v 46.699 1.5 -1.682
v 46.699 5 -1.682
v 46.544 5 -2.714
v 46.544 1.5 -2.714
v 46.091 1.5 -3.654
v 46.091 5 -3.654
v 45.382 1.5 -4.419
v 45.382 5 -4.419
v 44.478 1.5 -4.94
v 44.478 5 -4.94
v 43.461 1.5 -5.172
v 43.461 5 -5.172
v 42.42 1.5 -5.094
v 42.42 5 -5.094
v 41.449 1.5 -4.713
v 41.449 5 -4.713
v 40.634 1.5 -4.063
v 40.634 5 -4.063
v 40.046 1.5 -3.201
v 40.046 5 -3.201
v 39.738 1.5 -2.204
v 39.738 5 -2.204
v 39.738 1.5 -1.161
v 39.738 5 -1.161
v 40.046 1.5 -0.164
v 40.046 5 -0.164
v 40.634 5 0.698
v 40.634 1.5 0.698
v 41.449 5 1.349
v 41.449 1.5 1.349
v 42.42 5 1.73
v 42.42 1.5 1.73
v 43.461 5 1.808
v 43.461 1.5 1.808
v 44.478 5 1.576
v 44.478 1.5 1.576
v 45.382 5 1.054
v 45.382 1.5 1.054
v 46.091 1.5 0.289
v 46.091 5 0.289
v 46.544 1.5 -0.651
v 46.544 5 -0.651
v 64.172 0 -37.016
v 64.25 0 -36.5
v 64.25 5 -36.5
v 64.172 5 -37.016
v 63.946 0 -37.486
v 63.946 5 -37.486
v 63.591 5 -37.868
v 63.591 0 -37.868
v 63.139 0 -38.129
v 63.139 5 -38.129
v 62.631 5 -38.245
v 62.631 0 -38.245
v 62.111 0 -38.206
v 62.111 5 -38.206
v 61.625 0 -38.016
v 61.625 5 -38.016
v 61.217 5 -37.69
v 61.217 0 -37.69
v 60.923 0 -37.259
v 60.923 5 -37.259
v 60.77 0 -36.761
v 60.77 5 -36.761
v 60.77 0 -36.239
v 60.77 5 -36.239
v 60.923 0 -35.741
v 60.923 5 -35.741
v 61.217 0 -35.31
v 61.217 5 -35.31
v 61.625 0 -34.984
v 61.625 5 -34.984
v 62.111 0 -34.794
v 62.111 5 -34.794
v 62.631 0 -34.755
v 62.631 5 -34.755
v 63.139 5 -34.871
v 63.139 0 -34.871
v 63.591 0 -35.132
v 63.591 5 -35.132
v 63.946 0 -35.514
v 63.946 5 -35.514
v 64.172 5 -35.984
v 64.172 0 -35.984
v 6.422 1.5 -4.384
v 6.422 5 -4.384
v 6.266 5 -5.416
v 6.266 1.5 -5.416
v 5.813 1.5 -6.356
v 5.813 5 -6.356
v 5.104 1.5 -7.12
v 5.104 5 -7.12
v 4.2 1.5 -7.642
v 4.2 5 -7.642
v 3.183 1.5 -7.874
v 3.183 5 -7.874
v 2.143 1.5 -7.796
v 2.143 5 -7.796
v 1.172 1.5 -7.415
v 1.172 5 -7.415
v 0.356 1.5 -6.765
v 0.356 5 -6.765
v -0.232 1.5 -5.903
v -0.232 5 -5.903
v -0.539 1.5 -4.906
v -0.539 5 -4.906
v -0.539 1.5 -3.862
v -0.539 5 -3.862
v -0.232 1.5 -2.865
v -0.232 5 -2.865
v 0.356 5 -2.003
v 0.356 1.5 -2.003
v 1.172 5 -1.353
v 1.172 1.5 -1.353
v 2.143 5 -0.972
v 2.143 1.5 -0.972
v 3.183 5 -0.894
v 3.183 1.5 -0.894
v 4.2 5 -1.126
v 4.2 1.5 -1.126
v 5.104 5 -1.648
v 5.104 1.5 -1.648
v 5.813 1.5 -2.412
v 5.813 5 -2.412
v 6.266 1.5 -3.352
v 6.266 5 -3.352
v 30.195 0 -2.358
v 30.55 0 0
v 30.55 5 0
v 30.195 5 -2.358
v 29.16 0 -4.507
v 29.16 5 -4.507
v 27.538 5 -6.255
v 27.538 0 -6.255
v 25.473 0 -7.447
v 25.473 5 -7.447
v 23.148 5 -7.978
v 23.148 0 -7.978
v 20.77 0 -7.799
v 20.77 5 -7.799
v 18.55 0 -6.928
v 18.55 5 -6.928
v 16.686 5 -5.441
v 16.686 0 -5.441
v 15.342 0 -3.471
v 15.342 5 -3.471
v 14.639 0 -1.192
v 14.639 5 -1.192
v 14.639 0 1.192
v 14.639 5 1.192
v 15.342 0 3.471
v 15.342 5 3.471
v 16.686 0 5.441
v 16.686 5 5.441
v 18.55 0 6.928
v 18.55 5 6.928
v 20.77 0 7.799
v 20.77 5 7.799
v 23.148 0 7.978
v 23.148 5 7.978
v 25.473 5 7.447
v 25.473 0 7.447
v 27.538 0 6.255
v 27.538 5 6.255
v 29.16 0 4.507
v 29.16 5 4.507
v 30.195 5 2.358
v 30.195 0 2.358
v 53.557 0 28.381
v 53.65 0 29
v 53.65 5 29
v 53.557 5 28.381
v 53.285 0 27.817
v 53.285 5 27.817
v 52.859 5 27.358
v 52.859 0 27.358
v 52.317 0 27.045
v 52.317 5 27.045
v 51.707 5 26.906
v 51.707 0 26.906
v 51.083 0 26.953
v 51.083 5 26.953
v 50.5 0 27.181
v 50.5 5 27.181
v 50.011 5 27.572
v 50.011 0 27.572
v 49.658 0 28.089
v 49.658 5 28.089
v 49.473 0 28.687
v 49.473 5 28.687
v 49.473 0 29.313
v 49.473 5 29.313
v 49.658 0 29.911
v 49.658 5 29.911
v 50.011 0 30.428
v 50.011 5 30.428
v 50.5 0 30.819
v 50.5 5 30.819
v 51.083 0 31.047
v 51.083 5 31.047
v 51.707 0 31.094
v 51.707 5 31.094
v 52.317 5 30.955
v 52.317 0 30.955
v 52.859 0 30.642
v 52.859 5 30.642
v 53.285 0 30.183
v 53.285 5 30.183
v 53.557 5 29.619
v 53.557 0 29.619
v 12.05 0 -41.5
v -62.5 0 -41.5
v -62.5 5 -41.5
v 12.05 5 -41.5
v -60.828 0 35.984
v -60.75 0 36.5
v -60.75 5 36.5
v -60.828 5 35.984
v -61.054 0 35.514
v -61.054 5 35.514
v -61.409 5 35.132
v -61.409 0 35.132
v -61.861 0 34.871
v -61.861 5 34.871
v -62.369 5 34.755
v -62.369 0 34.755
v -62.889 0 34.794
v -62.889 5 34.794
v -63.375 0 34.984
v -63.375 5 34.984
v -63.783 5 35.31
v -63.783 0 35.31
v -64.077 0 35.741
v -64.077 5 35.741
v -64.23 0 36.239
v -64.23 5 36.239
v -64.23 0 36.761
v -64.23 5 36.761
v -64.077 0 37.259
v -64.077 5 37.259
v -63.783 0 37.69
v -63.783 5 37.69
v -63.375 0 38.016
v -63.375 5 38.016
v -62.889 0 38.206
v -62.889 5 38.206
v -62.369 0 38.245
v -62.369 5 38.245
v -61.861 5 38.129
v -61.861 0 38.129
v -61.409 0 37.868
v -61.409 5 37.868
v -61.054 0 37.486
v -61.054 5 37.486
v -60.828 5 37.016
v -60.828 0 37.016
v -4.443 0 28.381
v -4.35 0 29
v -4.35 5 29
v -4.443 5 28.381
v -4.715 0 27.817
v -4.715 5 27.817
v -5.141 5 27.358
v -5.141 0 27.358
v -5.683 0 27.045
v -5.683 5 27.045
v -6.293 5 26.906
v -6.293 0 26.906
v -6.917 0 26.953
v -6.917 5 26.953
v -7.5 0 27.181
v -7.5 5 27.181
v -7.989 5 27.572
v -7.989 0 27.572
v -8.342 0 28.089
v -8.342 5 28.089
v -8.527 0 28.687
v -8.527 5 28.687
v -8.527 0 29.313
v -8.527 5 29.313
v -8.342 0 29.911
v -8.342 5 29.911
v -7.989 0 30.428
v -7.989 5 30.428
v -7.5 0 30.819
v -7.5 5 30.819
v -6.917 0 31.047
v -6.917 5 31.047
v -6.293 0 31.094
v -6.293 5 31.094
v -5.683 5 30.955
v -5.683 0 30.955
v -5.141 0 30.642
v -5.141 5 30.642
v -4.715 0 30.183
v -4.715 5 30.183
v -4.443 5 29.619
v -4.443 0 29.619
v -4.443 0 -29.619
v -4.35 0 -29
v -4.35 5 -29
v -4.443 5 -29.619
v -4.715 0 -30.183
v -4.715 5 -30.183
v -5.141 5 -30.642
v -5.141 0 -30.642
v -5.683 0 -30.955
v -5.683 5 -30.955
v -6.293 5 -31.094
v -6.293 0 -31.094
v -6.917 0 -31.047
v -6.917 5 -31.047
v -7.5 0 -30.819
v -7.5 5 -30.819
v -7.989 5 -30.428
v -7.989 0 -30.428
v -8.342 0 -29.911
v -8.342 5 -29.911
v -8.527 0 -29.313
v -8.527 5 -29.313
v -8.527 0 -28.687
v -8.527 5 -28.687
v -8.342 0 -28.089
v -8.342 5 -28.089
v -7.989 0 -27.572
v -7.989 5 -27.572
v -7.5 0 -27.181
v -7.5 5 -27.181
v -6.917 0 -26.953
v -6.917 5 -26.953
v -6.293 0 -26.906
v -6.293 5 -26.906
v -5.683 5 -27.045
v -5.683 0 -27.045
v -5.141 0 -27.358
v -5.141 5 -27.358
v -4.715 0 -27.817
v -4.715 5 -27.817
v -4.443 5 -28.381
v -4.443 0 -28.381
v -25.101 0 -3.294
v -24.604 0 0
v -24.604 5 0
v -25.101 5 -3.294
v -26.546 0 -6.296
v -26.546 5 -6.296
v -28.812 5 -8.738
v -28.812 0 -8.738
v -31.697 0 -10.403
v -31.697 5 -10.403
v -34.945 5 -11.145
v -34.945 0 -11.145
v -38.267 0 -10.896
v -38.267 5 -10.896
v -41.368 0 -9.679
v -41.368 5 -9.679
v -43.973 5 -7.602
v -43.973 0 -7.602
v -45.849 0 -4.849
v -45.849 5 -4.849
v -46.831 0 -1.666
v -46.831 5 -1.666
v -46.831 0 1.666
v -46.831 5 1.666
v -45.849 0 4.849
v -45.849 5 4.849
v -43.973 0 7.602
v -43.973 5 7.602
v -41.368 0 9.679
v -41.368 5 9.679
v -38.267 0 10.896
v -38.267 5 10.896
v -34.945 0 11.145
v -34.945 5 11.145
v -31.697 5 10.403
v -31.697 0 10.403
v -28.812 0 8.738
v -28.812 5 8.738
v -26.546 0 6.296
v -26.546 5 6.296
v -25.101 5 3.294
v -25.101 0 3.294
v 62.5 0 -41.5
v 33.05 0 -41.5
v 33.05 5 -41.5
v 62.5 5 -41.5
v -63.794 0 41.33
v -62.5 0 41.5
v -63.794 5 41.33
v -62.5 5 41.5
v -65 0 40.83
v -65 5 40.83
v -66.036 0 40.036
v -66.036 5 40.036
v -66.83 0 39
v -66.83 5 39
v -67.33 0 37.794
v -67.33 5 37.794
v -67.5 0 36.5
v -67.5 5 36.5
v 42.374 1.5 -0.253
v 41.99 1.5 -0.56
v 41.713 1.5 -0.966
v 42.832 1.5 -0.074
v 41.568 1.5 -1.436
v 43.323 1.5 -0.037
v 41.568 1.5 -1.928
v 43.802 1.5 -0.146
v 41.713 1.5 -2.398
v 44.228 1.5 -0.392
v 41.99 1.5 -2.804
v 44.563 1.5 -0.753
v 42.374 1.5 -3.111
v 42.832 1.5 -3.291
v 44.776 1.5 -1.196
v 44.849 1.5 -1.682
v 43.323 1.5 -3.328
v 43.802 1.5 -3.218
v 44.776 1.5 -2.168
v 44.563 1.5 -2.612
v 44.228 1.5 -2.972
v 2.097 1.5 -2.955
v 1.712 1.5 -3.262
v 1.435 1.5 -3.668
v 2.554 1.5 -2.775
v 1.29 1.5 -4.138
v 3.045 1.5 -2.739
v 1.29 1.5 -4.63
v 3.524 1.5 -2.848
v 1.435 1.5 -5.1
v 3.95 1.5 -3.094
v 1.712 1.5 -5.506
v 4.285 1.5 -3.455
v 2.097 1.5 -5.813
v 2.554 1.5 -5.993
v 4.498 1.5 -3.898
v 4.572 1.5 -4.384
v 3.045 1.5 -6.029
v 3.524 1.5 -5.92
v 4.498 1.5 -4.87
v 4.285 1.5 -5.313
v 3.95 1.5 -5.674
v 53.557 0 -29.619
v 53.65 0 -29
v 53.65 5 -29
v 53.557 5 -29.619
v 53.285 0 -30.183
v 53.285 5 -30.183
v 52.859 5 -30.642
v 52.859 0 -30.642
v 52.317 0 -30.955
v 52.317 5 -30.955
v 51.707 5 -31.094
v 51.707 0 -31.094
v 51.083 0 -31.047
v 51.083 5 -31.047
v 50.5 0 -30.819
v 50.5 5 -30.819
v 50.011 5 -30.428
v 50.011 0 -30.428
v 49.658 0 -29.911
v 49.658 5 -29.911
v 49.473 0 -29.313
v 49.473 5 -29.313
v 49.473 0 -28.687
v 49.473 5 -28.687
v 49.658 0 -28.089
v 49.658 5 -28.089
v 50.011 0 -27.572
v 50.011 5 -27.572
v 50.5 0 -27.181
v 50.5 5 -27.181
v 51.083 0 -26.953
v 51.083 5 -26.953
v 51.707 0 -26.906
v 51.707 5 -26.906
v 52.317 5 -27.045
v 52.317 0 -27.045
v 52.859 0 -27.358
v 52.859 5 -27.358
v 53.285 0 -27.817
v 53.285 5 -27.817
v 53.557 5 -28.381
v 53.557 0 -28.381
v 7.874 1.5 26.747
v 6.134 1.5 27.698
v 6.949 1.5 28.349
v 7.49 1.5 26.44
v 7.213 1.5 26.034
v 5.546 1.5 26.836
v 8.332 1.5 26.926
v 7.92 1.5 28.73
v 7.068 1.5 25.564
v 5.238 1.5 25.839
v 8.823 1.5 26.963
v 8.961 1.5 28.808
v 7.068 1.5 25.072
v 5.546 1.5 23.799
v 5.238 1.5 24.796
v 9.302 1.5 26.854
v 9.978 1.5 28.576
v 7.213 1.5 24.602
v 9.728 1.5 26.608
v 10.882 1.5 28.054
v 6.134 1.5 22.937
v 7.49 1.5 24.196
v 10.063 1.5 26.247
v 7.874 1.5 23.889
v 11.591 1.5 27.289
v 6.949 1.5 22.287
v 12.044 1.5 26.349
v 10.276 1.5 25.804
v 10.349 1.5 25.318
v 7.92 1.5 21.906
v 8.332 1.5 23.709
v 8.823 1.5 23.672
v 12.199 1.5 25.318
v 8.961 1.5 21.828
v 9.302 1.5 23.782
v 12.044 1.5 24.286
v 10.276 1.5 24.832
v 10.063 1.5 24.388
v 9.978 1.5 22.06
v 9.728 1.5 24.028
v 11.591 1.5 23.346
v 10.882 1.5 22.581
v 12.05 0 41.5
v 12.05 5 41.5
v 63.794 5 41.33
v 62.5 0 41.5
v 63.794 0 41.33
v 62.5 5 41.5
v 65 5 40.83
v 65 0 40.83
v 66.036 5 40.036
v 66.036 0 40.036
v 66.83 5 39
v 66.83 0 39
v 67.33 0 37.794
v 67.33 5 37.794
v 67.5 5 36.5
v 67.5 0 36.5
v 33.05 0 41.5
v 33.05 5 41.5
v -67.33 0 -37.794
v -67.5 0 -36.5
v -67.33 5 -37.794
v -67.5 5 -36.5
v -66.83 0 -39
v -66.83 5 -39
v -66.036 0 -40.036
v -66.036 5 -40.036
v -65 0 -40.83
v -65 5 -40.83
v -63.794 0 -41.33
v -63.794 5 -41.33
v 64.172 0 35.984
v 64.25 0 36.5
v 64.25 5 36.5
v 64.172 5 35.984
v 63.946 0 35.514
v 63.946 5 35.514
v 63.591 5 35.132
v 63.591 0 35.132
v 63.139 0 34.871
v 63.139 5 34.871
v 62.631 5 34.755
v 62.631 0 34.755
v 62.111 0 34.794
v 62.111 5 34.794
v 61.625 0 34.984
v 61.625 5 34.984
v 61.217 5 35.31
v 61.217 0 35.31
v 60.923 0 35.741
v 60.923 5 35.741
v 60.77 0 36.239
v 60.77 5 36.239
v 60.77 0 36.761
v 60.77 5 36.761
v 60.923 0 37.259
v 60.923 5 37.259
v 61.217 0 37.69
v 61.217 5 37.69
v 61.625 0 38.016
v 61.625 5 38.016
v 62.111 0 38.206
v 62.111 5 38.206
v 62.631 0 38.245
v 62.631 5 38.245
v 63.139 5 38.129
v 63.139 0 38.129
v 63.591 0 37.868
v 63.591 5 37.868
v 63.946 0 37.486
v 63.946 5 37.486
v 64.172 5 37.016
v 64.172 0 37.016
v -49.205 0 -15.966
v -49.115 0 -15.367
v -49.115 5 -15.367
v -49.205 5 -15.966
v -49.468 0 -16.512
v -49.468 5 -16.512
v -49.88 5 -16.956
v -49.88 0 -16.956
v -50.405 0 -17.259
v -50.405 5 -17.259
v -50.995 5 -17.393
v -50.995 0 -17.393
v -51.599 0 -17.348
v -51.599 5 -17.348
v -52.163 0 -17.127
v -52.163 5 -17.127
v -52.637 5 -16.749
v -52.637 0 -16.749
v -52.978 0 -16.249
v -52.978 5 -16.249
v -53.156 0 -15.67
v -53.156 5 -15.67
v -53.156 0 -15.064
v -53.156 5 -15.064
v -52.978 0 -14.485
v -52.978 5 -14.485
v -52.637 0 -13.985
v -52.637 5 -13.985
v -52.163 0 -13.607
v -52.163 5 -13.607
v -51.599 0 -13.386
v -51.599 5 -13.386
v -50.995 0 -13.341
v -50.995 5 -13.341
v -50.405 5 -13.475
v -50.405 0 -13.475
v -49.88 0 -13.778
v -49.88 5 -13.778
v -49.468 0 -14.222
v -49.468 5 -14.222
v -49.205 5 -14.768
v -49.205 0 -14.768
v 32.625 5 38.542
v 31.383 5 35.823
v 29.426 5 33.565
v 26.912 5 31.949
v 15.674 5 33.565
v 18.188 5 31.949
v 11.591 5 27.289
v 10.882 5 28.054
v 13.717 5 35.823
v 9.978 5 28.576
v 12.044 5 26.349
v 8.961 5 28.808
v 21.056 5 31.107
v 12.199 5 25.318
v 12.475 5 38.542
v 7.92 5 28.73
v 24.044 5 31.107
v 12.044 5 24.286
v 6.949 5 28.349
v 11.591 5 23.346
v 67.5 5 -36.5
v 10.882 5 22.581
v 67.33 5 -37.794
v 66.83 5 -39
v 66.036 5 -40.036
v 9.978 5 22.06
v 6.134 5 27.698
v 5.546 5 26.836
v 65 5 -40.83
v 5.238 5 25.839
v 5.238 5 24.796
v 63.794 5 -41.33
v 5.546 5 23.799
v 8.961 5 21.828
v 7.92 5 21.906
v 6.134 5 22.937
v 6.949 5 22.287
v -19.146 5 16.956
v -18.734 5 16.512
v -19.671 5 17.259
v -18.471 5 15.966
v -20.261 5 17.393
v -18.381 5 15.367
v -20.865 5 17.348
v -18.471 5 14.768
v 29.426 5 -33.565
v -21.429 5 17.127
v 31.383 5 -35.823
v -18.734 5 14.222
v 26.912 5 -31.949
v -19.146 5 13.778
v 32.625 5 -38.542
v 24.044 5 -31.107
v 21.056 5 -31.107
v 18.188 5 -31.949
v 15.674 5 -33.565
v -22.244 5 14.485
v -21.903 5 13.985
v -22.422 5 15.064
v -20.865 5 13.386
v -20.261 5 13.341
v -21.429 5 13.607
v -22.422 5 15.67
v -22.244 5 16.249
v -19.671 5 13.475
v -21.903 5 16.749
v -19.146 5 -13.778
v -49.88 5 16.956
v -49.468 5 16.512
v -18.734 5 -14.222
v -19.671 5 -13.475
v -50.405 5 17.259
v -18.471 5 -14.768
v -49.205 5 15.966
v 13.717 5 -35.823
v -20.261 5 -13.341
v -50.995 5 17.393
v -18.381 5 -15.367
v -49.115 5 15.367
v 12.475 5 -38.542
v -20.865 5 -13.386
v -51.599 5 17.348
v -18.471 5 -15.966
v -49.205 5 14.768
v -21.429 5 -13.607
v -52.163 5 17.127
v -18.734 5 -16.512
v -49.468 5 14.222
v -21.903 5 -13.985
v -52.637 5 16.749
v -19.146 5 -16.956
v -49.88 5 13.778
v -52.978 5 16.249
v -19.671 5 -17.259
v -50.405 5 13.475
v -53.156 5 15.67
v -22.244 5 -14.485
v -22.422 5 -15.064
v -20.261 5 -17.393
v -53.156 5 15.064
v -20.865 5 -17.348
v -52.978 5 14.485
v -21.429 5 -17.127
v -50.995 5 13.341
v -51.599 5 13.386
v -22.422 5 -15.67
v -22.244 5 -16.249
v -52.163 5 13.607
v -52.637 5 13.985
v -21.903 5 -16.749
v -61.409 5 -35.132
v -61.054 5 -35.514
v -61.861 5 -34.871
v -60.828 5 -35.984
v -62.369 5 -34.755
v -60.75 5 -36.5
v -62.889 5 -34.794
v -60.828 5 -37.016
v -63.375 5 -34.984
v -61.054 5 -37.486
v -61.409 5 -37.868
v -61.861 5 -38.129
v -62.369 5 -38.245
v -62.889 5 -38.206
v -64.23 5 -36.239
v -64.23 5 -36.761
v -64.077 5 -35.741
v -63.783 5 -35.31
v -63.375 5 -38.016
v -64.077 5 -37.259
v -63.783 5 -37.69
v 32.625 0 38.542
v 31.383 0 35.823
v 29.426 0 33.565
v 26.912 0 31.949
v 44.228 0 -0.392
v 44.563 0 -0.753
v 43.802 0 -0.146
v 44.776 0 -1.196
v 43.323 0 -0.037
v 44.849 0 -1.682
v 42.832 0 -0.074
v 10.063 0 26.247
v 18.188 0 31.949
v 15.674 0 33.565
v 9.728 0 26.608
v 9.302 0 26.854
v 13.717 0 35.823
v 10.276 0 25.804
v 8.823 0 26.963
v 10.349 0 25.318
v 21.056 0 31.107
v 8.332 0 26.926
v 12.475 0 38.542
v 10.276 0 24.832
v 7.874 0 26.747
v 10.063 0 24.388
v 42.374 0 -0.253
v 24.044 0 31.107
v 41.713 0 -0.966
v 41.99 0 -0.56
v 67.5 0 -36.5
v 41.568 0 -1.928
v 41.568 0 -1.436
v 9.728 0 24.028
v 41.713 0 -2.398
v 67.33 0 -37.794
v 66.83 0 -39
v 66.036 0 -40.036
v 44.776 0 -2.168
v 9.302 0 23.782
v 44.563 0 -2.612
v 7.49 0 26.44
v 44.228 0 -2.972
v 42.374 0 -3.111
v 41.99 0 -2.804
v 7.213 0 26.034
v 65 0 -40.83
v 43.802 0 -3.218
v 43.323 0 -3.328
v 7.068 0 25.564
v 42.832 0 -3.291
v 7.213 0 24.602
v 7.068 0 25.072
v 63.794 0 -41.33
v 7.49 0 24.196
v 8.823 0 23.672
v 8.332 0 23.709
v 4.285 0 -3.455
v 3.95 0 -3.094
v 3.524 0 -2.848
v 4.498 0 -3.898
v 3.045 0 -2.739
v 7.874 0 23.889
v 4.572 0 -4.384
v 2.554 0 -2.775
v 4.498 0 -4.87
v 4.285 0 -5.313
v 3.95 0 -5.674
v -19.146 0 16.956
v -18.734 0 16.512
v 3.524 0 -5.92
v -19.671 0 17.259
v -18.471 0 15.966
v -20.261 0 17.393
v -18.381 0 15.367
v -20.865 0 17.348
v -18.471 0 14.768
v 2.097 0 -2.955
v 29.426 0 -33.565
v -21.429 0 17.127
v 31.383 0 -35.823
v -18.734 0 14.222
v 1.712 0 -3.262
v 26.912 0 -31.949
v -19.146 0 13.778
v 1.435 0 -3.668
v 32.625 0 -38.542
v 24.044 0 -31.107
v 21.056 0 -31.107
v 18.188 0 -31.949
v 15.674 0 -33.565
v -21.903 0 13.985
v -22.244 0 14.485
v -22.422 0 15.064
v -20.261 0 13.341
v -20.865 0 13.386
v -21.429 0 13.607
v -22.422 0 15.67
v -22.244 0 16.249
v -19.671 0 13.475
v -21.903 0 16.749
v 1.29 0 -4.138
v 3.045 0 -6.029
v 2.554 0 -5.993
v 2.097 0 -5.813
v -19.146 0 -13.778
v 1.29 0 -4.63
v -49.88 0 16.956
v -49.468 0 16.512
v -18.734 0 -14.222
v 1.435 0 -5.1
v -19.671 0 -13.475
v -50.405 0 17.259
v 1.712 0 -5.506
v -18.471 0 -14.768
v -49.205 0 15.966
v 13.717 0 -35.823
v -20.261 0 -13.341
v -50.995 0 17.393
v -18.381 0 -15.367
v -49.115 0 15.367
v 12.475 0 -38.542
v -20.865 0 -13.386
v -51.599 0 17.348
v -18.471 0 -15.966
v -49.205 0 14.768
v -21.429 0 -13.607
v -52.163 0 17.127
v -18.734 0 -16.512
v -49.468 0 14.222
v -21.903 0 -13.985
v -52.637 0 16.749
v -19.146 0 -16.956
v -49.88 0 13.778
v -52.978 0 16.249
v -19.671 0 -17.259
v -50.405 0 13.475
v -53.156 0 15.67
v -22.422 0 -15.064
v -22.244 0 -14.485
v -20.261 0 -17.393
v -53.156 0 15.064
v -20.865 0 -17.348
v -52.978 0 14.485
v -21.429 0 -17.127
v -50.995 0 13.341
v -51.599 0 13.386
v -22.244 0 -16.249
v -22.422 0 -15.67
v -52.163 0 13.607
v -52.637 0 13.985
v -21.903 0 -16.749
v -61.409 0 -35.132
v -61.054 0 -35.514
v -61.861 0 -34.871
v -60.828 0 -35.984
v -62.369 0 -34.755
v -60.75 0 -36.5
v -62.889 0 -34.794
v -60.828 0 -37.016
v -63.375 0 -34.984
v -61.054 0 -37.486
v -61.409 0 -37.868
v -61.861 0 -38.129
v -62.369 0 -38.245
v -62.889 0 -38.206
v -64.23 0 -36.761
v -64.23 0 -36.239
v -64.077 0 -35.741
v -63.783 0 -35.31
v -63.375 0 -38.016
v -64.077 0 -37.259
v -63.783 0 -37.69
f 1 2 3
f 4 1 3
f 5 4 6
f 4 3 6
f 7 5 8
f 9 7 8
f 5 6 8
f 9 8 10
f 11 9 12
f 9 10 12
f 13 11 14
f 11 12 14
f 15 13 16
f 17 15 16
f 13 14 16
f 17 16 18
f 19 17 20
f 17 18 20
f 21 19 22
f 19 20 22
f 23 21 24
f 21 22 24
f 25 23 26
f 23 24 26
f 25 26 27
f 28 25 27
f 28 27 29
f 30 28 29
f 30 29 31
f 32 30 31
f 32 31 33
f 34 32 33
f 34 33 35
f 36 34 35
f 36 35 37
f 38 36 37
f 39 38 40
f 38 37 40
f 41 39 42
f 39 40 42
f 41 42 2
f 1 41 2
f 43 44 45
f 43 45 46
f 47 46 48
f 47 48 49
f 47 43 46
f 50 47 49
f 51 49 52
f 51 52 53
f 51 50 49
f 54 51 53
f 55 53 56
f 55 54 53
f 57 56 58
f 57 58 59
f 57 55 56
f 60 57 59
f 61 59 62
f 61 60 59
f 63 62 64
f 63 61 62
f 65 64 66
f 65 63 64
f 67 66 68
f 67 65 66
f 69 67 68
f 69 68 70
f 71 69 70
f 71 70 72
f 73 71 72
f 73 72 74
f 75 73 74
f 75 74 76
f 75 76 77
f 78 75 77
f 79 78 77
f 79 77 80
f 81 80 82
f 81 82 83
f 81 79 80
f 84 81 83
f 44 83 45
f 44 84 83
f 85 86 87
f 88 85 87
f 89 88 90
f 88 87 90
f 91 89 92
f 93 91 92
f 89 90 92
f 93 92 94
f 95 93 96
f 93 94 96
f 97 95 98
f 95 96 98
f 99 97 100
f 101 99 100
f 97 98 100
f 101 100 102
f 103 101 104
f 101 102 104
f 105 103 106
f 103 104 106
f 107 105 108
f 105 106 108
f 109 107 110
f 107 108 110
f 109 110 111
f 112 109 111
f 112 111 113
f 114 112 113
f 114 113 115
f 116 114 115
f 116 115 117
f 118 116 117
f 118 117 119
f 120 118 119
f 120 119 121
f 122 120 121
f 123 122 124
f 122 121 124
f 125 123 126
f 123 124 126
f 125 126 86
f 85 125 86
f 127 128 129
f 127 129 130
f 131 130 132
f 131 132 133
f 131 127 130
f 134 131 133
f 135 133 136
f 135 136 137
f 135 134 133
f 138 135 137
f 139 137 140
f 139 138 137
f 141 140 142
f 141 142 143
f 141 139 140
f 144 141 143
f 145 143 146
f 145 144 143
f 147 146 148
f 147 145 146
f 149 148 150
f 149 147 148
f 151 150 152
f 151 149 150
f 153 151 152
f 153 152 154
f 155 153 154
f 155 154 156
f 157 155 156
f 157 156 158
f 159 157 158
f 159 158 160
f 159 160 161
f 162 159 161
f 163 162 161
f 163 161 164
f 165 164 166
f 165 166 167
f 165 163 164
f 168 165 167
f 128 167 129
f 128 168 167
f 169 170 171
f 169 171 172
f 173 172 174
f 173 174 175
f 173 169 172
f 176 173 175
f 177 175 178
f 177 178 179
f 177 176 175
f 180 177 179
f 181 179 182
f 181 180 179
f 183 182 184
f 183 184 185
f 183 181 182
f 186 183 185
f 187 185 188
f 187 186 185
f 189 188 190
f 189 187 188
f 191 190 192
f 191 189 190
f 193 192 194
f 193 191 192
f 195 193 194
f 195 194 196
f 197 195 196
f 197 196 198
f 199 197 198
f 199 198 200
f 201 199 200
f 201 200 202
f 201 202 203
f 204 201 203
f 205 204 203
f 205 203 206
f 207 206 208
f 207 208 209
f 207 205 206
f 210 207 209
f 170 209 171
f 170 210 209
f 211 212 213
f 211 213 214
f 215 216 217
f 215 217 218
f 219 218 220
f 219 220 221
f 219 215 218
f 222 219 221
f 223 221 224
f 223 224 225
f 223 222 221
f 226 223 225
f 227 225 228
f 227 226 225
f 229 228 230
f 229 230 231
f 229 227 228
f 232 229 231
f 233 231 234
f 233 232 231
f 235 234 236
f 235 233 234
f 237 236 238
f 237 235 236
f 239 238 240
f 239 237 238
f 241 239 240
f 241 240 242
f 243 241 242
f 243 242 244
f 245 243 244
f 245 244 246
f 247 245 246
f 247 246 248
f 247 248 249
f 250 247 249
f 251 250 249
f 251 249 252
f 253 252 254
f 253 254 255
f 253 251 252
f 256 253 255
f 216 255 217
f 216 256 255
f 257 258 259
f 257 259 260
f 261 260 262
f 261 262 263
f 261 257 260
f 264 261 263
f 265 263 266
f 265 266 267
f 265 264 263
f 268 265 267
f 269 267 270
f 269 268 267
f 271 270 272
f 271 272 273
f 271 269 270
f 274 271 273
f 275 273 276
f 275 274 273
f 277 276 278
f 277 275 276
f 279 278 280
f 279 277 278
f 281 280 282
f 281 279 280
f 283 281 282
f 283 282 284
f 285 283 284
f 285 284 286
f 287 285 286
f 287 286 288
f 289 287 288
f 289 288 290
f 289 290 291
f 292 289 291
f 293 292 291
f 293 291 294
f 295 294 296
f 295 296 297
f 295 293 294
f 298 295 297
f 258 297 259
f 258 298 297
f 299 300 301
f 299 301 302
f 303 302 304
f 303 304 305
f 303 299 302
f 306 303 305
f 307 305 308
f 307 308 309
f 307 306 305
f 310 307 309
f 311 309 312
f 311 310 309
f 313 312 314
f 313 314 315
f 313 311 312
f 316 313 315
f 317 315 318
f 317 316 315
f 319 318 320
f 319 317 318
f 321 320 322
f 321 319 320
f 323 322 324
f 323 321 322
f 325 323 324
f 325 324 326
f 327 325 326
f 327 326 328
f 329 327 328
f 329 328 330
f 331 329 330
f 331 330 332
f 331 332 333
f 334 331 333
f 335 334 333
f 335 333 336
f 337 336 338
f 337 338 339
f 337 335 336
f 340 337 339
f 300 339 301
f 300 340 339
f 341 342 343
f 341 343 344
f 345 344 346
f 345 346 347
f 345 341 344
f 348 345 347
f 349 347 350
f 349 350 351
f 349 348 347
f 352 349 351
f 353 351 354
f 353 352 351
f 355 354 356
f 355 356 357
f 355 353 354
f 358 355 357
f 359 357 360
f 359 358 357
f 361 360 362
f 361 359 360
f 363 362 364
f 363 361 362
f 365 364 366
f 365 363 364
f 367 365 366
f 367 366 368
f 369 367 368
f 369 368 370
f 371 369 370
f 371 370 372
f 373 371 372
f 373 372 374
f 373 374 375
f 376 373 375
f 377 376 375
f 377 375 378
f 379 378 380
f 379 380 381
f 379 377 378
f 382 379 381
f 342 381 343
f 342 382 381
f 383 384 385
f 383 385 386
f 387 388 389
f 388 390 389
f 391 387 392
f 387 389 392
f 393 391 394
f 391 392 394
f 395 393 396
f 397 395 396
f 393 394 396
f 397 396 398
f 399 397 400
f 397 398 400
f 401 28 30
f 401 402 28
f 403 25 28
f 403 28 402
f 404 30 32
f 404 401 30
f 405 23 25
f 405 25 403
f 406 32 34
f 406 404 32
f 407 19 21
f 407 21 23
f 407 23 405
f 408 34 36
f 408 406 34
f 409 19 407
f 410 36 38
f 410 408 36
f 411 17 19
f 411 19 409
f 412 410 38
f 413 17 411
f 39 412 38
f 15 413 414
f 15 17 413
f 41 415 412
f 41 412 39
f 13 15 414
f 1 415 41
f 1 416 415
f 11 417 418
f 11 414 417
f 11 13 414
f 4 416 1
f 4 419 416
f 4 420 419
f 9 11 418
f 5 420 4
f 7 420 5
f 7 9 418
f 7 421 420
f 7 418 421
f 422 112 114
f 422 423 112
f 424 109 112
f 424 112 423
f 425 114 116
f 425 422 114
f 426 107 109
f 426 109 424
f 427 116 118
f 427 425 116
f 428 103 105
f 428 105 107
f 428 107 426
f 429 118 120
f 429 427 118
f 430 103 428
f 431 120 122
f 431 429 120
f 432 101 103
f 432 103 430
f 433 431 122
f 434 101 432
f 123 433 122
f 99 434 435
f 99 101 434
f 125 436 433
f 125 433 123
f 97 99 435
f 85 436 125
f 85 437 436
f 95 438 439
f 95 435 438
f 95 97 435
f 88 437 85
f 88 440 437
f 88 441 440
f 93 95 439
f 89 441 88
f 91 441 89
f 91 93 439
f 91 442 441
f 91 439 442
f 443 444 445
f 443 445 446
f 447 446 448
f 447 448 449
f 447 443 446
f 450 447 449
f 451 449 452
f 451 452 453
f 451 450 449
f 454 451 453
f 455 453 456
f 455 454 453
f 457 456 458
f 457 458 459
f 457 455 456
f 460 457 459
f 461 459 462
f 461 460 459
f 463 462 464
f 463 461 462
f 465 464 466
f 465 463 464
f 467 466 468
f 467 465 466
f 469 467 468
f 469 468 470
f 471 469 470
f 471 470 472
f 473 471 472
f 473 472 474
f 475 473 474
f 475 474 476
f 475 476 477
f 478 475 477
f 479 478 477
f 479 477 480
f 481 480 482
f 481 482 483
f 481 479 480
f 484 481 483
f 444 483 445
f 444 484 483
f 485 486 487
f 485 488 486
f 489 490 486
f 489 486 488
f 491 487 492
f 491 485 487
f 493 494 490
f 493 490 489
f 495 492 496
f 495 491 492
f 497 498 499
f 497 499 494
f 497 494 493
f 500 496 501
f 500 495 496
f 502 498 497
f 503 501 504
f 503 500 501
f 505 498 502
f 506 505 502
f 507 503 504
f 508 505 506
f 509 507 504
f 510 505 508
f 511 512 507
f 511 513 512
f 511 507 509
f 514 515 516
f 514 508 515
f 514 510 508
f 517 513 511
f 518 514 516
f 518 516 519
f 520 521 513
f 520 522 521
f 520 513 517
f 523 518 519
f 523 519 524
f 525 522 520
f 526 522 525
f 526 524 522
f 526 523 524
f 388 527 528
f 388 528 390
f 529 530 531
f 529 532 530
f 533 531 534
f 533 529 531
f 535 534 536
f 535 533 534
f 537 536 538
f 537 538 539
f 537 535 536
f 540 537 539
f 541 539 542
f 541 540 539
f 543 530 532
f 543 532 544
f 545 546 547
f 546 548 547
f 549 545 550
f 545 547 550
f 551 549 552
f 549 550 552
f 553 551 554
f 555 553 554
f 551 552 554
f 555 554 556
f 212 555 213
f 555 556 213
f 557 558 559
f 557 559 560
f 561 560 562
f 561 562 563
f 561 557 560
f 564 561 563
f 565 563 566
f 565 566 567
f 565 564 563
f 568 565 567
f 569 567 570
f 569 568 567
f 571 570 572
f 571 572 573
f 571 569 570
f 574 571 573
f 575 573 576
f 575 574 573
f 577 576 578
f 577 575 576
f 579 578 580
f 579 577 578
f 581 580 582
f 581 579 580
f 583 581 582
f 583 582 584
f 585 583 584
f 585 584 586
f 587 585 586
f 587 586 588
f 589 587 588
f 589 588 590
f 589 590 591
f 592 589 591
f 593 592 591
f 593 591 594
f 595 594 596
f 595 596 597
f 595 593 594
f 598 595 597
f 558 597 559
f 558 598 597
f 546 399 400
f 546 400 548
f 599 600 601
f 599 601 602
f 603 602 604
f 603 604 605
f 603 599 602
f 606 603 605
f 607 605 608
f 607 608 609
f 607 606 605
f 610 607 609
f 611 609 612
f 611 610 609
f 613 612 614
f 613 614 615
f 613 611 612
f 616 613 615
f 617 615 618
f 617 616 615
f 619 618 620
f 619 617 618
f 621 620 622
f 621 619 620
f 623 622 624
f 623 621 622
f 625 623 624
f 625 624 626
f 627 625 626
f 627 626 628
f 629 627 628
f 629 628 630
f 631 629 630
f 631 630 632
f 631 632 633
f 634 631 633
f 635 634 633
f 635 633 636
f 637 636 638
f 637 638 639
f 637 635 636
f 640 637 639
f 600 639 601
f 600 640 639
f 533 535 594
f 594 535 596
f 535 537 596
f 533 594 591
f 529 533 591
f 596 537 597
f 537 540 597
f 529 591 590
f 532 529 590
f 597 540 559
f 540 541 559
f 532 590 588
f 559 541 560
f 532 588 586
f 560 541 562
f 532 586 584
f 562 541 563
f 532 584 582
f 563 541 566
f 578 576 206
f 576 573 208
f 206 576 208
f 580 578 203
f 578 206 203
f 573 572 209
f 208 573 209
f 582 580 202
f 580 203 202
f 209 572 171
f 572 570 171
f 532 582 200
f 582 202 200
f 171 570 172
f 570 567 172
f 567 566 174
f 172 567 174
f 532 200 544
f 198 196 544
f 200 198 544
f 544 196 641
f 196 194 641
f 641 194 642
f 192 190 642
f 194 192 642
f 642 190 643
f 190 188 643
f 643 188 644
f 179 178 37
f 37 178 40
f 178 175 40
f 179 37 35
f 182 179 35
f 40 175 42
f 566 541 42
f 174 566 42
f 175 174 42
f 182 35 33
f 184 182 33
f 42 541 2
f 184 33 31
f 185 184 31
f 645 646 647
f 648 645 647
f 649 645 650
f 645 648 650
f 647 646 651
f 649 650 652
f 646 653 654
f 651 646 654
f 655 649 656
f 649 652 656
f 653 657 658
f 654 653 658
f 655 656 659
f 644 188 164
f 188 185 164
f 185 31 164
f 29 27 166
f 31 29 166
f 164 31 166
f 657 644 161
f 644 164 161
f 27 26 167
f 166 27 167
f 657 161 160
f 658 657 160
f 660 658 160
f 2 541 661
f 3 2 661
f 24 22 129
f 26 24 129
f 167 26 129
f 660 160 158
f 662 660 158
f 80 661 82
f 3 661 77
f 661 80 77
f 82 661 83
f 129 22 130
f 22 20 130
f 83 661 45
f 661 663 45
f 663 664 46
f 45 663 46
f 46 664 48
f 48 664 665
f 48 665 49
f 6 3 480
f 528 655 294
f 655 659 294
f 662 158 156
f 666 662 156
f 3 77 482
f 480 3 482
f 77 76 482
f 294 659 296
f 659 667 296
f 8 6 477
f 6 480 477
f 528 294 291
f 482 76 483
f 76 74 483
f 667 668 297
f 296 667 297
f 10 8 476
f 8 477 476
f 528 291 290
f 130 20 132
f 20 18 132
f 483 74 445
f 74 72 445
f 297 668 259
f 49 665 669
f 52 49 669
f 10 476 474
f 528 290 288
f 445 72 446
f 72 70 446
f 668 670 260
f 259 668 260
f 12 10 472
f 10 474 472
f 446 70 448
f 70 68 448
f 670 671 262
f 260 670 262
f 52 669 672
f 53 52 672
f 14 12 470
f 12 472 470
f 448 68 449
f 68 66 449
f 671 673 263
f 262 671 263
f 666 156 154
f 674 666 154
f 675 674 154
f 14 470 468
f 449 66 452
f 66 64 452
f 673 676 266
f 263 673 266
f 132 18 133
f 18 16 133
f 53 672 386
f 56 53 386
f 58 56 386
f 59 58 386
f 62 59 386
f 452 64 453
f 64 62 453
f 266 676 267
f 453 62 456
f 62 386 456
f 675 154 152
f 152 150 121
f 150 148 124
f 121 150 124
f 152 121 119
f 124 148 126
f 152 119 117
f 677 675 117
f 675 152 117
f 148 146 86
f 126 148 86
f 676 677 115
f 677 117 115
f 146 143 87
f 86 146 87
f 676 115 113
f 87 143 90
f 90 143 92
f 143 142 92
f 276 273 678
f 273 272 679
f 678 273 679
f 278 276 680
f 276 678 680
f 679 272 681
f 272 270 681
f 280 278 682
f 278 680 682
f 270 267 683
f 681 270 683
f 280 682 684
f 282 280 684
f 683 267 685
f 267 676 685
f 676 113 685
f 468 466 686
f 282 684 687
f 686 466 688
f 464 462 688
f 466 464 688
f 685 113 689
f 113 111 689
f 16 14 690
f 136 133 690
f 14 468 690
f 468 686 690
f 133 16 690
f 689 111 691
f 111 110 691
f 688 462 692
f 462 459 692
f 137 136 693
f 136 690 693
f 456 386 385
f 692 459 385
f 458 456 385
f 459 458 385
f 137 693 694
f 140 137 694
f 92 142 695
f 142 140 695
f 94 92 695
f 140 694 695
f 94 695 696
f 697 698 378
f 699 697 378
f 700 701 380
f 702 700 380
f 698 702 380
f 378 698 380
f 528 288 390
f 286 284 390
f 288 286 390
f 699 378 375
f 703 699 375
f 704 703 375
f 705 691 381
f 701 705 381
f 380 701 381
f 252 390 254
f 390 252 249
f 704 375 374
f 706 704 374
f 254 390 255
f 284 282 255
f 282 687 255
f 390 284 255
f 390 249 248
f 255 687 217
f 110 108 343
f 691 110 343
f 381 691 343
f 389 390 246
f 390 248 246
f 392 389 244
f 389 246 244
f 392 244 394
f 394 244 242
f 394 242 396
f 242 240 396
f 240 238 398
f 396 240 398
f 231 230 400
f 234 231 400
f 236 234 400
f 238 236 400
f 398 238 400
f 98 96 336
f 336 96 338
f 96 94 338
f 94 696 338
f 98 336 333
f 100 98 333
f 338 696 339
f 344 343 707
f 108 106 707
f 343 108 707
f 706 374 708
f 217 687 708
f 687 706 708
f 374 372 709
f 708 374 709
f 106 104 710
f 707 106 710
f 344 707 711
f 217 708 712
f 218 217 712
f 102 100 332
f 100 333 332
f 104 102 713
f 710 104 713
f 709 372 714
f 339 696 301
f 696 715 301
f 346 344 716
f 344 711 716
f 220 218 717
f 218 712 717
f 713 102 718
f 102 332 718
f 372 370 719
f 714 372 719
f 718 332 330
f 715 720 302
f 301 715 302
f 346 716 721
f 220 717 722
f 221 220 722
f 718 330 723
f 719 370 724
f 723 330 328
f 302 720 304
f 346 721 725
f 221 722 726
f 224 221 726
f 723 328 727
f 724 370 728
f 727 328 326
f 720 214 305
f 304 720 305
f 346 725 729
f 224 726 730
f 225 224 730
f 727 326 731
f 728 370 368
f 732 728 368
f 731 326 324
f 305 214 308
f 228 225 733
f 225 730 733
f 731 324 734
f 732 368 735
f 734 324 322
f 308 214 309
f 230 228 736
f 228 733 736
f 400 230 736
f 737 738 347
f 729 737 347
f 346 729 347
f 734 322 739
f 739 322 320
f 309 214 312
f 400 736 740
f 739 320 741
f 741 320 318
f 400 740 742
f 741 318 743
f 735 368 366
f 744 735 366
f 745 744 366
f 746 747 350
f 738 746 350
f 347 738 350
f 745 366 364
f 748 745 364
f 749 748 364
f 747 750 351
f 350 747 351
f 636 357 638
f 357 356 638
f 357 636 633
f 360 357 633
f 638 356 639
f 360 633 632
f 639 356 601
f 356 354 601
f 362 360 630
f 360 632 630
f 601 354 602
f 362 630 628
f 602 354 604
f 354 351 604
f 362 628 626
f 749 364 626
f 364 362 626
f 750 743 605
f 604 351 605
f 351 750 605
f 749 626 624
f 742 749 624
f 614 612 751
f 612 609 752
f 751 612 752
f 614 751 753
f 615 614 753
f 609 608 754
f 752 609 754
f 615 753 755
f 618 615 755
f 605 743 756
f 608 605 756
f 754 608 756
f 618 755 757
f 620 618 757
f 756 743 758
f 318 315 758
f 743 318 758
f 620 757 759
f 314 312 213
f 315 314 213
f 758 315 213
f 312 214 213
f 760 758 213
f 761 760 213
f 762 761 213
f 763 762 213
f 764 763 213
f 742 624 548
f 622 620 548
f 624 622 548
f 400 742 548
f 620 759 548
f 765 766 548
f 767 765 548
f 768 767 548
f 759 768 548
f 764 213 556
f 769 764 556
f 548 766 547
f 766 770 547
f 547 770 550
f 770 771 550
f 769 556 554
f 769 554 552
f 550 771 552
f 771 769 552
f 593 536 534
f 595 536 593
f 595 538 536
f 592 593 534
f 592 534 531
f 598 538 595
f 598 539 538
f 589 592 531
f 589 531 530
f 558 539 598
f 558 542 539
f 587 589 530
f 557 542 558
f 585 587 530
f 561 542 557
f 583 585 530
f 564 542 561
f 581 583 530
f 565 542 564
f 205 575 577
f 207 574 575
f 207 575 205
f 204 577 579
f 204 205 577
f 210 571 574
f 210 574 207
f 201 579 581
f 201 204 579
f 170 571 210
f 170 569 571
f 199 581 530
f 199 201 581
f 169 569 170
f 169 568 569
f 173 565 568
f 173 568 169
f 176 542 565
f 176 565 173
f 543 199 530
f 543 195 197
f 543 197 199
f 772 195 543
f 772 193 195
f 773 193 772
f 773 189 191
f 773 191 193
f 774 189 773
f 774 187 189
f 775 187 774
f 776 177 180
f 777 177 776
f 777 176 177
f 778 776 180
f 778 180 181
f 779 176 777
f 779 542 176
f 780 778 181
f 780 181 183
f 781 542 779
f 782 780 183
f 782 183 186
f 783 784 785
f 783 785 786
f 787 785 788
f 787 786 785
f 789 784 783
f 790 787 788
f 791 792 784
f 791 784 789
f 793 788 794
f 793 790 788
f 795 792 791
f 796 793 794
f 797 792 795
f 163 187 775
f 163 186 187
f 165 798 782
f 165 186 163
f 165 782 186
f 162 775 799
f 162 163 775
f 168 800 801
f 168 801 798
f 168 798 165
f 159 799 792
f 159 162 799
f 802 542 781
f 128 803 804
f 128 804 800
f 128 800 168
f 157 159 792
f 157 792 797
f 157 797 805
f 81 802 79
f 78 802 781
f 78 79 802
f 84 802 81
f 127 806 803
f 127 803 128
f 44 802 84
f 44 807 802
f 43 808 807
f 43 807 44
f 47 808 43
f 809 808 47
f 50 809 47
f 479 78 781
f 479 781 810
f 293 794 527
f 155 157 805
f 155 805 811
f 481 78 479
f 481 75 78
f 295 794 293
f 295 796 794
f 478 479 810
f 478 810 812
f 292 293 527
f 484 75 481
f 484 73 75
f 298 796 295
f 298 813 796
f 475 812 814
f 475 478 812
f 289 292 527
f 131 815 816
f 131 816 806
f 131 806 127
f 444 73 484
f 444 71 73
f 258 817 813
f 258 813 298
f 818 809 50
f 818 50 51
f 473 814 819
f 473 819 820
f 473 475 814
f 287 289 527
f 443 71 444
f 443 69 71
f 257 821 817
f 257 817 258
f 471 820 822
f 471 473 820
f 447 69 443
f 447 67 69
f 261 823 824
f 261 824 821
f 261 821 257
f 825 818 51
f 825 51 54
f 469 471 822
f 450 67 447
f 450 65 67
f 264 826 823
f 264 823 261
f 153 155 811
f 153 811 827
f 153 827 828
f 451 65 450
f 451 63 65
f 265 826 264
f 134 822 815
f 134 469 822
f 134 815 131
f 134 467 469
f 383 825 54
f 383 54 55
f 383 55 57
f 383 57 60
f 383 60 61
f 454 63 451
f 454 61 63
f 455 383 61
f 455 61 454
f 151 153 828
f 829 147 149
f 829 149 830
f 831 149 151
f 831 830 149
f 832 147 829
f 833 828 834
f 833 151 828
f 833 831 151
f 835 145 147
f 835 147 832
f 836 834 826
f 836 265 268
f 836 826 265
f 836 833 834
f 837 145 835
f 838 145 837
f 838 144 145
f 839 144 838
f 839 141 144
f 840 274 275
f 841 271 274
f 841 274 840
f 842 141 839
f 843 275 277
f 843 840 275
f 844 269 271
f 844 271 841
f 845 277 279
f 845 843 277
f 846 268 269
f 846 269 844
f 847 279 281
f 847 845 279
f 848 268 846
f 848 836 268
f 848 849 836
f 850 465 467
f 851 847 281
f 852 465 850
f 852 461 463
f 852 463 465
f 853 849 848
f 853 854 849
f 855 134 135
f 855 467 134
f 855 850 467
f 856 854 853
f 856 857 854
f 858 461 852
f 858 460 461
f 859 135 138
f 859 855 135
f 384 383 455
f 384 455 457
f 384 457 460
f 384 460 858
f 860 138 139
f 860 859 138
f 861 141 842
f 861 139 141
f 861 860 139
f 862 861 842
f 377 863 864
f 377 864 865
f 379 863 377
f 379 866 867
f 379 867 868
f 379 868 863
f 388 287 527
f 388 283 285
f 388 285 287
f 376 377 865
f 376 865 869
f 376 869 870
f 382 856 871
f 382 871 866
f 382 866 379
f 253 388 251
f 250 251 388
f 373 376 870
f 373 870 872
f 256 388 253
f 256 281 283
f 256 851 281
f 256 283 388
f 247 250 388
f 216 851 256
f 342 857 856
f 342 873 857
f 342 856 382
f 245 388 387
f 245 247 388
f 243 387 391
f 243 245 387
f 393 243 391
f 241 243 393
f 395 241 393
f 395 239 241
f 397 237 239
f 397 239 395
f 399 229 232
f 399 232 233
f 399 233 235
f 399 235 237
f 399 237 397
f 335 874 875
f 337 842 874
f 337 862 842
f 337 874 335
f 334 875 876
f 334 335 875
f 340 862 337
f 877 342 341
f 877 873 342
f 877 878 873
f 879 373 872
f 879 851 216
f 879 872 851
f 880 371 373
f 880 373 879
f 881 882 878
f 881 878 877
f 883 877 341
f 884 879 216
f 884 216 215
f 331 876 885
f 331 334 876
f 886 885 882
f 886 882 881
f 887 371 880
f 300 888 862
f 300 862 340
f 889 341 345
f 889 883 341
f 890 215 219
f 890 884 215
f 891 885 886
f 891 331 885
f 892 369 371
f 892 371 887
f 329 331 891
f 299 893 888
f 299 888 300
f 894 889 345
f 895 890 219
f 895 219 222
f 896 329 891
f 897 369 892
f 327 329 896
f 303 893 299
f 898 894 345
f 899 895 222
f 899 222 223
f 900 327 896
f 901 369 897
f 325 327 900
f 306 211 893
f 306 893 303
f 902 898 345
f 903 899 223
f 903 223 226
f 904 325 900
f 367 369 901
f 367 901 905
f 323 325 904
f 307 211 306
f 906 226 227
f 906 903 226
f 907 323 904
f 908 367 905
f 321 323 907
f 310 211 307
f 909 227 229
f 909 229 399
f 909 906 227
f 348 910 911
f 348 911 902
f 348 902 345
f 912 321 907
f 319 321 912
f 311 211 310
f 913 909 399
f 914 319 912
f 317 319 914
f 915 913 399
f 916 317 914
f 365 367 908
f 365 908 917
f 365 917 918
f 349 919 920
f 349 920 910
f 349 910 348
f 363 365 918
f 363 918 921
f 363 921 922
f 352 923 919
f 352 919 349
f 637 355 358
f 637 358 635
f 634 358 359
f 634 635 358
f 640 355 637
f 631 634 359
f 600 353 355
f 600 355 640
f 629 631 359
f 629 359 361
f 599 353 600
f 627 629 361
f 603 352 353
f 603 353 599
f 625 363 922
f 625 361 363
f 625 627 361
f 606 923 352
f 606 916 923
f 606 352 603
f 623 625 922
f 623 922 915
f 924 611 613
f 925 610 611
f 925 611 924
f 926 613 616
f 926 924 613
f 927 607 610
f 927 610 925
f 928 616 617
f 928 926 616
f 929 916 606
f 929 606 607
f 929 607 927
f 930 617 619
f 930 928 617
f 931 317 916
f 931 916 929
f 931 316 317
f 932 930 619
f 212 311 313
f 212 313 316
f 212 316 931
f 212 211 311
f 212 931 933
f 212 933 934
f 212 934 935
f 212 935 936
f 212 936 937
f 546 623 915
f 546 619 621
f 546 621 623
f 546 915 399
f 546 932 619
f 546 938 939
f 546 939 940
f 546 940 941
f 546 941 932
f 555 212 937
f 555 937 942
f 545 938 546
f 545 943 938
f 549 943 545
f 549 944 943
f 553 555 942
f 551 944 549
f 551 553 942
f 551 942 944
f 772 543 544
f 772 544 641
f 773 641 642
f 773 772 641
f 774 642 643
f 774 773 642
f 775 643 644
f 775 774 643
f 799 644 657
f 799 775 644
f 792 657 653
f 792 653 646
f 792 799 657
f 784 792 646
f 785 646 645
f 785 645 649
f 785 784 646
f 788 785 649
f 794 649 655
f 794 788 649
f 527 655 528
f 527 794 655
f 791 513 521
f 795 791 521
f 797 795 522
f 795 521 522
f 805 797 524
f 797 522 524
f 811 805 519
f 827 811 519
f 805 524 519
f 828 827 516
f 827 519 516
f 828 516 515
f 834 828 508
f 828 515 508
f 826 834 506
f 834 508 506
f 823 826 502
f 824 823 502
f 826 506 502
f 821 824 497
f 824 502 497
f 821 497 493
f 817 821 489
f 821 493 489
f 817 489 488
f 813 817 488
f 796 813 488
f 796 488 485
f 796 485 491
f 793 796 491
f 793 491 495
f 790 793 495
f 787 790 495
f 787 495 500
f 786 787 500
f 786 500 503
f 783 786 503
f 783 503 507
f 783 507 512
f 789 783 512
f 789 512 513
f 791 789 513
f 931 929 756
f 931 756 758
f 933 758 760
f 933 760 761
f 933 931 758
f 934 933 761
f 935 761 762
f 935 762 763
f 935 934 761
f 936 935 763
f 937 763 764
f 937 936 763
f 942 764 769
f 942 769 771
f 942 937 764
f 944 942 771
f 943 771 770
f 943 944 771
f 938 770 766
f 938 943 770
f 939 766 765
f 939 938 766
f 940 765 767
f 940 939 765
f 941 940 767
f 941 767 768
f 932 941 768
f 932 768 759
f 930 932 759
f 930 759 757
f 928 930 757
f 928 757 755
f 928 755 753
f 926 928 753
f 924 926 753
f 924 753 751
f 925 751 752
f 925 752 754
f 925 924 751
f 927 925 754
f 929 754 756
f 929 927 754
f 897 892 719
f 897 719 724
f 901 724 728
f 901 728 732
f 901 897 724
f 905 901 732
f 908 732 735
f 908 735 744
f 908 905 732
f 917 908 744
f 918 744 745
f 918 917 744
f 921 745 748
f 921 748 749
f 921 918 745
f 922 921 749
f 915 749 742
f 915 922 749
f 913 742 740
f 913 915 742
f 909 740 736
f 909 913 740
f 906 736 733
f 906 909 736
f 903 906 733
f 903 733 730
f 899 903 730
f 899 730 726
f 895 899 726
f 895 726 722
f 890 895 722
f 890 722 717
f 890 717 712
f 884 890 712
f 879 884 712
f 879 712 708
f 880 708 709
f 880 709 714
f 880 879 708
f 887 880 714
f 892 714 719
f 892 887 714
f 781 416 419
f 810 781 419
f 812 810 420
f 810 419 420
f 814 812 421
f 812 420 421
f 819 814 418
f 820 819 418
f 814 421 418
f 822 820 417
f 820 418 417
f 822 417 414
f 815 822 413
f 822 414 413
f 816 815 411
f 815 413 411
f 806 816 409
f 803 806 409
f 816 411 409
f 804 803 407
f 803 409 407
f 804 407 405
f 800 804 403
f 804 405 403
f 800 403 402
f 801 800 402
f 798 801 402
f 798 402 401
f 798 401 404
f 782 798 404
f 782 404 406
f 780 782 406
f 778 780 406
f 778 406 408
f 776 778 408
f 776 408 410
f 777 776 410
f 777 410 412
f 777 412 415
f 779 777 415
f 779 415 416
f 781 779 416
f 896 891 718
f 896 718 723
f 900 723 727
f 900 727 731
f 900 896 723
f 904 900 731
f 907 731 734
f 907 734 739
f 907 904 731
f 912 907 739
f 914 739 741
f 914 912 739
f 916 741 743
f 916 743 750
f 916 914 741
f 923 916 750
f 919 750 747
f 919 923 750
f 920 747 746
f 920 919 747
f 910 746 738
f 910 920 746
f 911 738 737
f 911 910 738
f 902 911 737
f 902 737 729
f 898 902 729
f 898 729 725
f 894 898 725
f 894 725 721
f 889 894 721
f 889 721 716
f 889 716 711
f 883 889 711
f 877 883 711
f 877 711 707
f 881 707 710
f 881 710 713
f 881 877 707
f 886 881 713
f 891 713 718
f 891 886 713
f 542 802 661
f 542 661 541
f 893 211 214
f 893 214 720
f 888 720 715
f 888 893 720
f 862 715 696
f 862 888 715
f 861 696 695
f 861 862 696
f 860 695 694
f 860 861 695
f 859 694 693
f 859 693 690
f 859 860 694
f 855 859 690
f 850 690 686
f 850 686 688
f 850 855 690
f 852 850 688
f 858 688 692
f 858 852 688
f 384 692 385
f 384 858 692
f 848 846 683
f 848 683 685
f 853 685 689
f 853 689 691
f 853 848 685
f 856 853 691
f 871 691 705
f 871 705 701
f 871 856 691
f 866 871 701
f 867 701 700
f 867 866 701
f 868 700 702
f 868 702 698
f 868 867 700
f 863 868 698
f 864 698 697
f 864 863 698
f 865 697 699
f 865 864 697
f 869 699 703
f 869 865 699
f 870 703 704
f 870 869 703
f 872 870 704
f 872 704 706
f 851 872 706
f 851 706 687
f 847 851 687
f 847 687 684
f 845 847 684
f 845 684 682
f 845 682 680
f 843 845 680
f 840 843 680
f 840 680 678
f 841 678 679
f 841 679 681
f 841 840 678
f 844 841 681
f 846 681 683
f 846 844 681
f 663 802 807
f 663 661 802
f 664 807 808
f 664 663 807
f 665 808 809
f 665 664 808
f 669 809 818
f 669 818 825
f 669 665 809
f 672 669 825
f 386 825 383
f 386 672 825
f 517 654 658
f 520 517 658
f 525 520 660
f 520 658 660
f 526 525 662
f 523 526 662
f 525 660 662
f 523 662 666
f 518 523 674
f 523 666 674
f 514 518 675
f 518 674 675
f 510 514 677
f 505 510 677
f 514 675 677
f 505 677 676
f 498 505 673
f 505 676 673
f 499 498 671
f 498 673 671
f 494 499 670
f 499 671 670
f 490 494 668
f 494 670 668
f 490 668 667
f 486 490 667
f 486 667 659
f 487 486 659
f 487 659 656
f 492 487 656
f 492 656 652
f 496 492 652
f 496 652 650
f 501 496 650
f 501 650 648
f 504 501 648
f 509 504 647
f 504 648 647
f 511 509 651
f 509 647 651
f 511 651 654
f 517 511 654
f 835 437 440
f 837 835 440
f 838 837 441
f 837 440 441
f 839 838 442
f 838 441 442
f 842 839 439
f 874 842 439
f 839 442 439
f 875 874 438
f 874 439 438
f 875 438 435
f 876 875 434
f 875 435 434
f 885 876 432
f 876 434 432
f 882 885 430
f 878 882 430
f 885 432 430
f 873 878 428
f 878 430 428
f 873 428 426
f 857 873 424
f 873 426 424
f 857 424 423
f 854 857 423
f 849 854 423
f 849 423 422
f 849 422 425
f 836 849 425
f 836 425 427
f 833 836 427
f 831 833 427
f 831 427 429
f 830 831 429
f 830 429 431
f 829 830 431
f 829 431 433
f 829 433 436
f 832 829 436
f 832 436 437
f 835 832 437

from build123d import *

# Parameters (mm, degrees)
SKETCH1_R           = 2.1
SKETCH1_R_2         = 8
SKETCH1_R_3         = 11.176
SKETCH1_R_4         = 1.75
SKETCH1_R_5         = 2.032
BOSS_EXTRUDE1_DEPTH = 5
FILLET1_R           = 5
SKETCH8_R           = 1.65
CUT_EXTRUDE3_DEPTH  = 10
SKETCH9_R           = 3.5
SKETCH9_R_2         = 1.65
CUT_EXTRUDE4_DEPTH  = 3.5


with BuildPart() as part:
    # Sketch1 → Boss-Extrude1 (new body)
    with BuildSketch(Plane(origin=(0, 0, 0), x_dir=(1, 0, 0), z_dir=(0, 1, 0))):
        with BuildLine():
            Line((67.5, -41.5), (33.05, -41.5))
            ThreePointArc((33.05, -41.5), (22.55, -31), (12.05, -41.5))
            Line((12.05, -41.5), (-67.5, -41.5))
            Line((-67.5, -41.5), (-67.5, 41.5))
            Line((-67.5, 41.5), (12.05, 41.5))
            ThreePointArc((12.05, 41.5), (22.55, 31), (33.05, 41.5))
            Line((33.05, 41.5), (67.5, 41.5))
            Line((67.5, 41.5), (67.5, -41.5))
        make_face()
        with Locations((-6.45, 29)):
            Circle(SKETCH1_R, mode=Mode.SUBTRACT)
        with Locations((51.55, 29)):
            Circle(SKETCH1_R, mode=Mode.SUBTRACT)
        with Locations((51.55, -29)):
            Circle(SKETCH1_R, mode=Mode.SUBTRACT)
        with Locations((-6.45, -29)):
            Circle(SKETCH1_R, mode=Mode.SUBTRACT)
        with Locations((22.55, 0)):
            Circle(SKETCH1_R_2, mode=Mode.SUBTRACT)
        with Locations((-35.78, 0)):
            Circle(SKETCH1_R_3, mode=Mode.SUBTRACT)
        with Locations((-62.5, 36.5)):
            Circle(SKETCH1_R_4, mode=Mode.SUBTRACT)
        with Locations((62.5, 36.5)):
            Circle(SKETCH1_R_4, mode=Mode.SUBTRACT)
        with Locations((62.5, -36.5)):
            Circle(SKETCH1_R_4, mode=Mode.SUBTRACT)
        with Locations((-62.5, -36.5)):
            Circle(SKETCH1_R_4, mode=Mode.SUBTRACT)
        with Locations((-20.413, 15.367)):
            Circle(SKETCH1_R_5, mode=Mode.SUBTRACT)
        with Locations((-20.413, -15.367)):
            Circle(SKETCH1_R_5, mode=Mode.SUBTRACT)
        with Locations((-51.147, -15.367)):
            Circle(SKETCH1_R_5, mode=Mode.SUBTRACT)
        with Locations((-51.147, 15.367)):
            Circle(SKETCH1_R_5, mode=Mode.SUBTRACT)
    extrude(amount=BOSS_EXTRUDE1_DEPTH)

    # Fillet1
    fillet1_edges = [part.edges().sort_by_distance(p)[0] for p in [
        (67.5, 2.5, -41.5),
        (67.5, 2.5, 41.5),
        (-67.5, 2.5, 41.5),
        (-67.5, 2.5, -41.5),
    ]]
    fillet(fillet1_edges, radius=FILLET1_R)

    # Sketch8 → Cut-Extrude3 (cut)
    with BuildSketch(Plane(origin=(0, 5, 0), x_dir=(1, 0, 0), z_dir=(0, 1, 0))):
        with Locations((43.1993197, 1.68214862)):
            Circle(SKETCH8_R)
        with Locations((2.921522344, 4.384015291)):
            Circle(SKETCH8_R)
        with Locations((8.6993197, -25.31785138)):
            Circle(SKETCH8_R)
    extrude(amount=-CUT_EXTRUDE3_DEPTH, mode=Mode.SUBTRACT)

    # Sketch9 → Cut-Extrude4 (cut)
    with BuildSketch(Plane(origin=(0, 5, 0), x_dir=(1, 0, 0), z_dir=(0, 1, 0))):
        with Locations((2.921522344, 4.384015291)):
            Circle(SKETCH9_R)
        with Locations((2.921522344, 4.384015291)):
            Circle(SKETCH9_R_2, mode=Mode.SUBTRACT)
        with Locations((8.6993197, -25.31785138)):
            Circle(SKETCH9_R)
        with Locations((8.6993197, -25.31785138)):
            Circle(SKETCH9_R_2, mode=Mode.SUBTRACT)
        with Locations((43.1993197, 1.68214862)):
            Circle(SKETCH9_R)
        with Locations((43.1993197, 1.68214862)):
            Circle(SKETCH9_R_2, mode=Mode.SUBTRACT)
    extrude(amount=-CUT_EXTRUDE4_DEPTH, mode=Mode.SUBTRACT)


solid = part.part
